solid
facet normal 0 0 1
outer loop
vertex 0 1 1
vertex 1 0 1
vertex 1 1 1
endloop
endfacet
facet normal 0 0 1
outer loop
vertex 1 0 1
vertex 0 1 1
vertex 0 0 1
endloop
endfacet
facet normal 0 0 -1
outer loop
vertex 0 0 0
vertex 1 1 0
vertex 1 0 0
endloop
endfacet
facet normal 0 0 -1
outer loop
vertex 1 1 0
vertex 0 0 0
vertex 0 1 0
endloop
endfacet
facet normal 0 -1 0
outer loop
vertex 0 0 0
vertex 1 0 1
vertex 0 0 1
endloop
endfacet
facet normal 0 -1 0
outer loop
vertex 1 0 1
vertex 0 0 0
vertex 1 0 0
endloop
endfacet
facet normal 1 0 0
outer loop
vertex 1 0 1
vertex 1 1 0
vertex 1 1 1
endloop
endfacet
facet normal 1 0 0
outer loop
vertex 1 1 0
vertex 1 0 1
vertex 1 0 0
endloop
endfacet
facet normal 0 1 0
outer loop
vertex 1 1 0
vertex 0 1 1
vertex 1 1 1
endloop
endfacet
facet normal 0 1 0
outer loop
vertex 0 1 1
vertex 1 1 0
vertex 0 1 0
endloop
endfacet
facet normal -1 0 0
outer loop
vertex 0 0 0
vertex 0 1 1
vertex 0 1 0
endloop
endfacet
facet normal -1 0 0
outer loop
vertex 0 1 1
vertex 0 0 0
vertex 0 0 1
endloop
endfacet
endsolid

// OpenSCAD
//Author: 
//Date: 
//Description: Lesson 1.0 Introduction to OpenSCAD

/* 
Helpful JAWS and Windows commands for text editing:
If JAWS stops reading try focusing the menu bar and then pressing escape or focusing the editor window
Move cursor by word: CTRL + LEFT/RIGHT ARROW key
Move cursor to start of line: HOME (FN + LEFT ARROW KEY on most laptops)
Move cursor to end of line: END (FN + RIGHT ARROW KEY on most laptops)
Move cursor to beginning of file: CTRL + END
Move cursor to end of file: CTRL + HOME
Select: HOLD SHIFT AND MOVE CURSOR
Change punctuation level: JAWS KEY + SHIFT + 2
Read all from cursor: JAWS KEY + A
Read Current line: JAWS KEY + UP ARROW
Temporarily increase/decrease voice rate: ALT + CTRL + PAGE UP/PAGE DOWN (fn key and up/ down arrow on most laptops)
Spell curent line: JAWS KEY + UP ARROW twice quickly
*/

/* 
Exploring the Menus
ALT will focus the menu bar
You can use first letter navigation to get to things quickly i.e. the layered key stroke ALT > w > e will bring you to the 
*/
 
//Your first shape
cube([1,1,1]);

//TO DO: Make a larger cube render it, export it as an stl, and email it to fablab@tsbvi.edu
